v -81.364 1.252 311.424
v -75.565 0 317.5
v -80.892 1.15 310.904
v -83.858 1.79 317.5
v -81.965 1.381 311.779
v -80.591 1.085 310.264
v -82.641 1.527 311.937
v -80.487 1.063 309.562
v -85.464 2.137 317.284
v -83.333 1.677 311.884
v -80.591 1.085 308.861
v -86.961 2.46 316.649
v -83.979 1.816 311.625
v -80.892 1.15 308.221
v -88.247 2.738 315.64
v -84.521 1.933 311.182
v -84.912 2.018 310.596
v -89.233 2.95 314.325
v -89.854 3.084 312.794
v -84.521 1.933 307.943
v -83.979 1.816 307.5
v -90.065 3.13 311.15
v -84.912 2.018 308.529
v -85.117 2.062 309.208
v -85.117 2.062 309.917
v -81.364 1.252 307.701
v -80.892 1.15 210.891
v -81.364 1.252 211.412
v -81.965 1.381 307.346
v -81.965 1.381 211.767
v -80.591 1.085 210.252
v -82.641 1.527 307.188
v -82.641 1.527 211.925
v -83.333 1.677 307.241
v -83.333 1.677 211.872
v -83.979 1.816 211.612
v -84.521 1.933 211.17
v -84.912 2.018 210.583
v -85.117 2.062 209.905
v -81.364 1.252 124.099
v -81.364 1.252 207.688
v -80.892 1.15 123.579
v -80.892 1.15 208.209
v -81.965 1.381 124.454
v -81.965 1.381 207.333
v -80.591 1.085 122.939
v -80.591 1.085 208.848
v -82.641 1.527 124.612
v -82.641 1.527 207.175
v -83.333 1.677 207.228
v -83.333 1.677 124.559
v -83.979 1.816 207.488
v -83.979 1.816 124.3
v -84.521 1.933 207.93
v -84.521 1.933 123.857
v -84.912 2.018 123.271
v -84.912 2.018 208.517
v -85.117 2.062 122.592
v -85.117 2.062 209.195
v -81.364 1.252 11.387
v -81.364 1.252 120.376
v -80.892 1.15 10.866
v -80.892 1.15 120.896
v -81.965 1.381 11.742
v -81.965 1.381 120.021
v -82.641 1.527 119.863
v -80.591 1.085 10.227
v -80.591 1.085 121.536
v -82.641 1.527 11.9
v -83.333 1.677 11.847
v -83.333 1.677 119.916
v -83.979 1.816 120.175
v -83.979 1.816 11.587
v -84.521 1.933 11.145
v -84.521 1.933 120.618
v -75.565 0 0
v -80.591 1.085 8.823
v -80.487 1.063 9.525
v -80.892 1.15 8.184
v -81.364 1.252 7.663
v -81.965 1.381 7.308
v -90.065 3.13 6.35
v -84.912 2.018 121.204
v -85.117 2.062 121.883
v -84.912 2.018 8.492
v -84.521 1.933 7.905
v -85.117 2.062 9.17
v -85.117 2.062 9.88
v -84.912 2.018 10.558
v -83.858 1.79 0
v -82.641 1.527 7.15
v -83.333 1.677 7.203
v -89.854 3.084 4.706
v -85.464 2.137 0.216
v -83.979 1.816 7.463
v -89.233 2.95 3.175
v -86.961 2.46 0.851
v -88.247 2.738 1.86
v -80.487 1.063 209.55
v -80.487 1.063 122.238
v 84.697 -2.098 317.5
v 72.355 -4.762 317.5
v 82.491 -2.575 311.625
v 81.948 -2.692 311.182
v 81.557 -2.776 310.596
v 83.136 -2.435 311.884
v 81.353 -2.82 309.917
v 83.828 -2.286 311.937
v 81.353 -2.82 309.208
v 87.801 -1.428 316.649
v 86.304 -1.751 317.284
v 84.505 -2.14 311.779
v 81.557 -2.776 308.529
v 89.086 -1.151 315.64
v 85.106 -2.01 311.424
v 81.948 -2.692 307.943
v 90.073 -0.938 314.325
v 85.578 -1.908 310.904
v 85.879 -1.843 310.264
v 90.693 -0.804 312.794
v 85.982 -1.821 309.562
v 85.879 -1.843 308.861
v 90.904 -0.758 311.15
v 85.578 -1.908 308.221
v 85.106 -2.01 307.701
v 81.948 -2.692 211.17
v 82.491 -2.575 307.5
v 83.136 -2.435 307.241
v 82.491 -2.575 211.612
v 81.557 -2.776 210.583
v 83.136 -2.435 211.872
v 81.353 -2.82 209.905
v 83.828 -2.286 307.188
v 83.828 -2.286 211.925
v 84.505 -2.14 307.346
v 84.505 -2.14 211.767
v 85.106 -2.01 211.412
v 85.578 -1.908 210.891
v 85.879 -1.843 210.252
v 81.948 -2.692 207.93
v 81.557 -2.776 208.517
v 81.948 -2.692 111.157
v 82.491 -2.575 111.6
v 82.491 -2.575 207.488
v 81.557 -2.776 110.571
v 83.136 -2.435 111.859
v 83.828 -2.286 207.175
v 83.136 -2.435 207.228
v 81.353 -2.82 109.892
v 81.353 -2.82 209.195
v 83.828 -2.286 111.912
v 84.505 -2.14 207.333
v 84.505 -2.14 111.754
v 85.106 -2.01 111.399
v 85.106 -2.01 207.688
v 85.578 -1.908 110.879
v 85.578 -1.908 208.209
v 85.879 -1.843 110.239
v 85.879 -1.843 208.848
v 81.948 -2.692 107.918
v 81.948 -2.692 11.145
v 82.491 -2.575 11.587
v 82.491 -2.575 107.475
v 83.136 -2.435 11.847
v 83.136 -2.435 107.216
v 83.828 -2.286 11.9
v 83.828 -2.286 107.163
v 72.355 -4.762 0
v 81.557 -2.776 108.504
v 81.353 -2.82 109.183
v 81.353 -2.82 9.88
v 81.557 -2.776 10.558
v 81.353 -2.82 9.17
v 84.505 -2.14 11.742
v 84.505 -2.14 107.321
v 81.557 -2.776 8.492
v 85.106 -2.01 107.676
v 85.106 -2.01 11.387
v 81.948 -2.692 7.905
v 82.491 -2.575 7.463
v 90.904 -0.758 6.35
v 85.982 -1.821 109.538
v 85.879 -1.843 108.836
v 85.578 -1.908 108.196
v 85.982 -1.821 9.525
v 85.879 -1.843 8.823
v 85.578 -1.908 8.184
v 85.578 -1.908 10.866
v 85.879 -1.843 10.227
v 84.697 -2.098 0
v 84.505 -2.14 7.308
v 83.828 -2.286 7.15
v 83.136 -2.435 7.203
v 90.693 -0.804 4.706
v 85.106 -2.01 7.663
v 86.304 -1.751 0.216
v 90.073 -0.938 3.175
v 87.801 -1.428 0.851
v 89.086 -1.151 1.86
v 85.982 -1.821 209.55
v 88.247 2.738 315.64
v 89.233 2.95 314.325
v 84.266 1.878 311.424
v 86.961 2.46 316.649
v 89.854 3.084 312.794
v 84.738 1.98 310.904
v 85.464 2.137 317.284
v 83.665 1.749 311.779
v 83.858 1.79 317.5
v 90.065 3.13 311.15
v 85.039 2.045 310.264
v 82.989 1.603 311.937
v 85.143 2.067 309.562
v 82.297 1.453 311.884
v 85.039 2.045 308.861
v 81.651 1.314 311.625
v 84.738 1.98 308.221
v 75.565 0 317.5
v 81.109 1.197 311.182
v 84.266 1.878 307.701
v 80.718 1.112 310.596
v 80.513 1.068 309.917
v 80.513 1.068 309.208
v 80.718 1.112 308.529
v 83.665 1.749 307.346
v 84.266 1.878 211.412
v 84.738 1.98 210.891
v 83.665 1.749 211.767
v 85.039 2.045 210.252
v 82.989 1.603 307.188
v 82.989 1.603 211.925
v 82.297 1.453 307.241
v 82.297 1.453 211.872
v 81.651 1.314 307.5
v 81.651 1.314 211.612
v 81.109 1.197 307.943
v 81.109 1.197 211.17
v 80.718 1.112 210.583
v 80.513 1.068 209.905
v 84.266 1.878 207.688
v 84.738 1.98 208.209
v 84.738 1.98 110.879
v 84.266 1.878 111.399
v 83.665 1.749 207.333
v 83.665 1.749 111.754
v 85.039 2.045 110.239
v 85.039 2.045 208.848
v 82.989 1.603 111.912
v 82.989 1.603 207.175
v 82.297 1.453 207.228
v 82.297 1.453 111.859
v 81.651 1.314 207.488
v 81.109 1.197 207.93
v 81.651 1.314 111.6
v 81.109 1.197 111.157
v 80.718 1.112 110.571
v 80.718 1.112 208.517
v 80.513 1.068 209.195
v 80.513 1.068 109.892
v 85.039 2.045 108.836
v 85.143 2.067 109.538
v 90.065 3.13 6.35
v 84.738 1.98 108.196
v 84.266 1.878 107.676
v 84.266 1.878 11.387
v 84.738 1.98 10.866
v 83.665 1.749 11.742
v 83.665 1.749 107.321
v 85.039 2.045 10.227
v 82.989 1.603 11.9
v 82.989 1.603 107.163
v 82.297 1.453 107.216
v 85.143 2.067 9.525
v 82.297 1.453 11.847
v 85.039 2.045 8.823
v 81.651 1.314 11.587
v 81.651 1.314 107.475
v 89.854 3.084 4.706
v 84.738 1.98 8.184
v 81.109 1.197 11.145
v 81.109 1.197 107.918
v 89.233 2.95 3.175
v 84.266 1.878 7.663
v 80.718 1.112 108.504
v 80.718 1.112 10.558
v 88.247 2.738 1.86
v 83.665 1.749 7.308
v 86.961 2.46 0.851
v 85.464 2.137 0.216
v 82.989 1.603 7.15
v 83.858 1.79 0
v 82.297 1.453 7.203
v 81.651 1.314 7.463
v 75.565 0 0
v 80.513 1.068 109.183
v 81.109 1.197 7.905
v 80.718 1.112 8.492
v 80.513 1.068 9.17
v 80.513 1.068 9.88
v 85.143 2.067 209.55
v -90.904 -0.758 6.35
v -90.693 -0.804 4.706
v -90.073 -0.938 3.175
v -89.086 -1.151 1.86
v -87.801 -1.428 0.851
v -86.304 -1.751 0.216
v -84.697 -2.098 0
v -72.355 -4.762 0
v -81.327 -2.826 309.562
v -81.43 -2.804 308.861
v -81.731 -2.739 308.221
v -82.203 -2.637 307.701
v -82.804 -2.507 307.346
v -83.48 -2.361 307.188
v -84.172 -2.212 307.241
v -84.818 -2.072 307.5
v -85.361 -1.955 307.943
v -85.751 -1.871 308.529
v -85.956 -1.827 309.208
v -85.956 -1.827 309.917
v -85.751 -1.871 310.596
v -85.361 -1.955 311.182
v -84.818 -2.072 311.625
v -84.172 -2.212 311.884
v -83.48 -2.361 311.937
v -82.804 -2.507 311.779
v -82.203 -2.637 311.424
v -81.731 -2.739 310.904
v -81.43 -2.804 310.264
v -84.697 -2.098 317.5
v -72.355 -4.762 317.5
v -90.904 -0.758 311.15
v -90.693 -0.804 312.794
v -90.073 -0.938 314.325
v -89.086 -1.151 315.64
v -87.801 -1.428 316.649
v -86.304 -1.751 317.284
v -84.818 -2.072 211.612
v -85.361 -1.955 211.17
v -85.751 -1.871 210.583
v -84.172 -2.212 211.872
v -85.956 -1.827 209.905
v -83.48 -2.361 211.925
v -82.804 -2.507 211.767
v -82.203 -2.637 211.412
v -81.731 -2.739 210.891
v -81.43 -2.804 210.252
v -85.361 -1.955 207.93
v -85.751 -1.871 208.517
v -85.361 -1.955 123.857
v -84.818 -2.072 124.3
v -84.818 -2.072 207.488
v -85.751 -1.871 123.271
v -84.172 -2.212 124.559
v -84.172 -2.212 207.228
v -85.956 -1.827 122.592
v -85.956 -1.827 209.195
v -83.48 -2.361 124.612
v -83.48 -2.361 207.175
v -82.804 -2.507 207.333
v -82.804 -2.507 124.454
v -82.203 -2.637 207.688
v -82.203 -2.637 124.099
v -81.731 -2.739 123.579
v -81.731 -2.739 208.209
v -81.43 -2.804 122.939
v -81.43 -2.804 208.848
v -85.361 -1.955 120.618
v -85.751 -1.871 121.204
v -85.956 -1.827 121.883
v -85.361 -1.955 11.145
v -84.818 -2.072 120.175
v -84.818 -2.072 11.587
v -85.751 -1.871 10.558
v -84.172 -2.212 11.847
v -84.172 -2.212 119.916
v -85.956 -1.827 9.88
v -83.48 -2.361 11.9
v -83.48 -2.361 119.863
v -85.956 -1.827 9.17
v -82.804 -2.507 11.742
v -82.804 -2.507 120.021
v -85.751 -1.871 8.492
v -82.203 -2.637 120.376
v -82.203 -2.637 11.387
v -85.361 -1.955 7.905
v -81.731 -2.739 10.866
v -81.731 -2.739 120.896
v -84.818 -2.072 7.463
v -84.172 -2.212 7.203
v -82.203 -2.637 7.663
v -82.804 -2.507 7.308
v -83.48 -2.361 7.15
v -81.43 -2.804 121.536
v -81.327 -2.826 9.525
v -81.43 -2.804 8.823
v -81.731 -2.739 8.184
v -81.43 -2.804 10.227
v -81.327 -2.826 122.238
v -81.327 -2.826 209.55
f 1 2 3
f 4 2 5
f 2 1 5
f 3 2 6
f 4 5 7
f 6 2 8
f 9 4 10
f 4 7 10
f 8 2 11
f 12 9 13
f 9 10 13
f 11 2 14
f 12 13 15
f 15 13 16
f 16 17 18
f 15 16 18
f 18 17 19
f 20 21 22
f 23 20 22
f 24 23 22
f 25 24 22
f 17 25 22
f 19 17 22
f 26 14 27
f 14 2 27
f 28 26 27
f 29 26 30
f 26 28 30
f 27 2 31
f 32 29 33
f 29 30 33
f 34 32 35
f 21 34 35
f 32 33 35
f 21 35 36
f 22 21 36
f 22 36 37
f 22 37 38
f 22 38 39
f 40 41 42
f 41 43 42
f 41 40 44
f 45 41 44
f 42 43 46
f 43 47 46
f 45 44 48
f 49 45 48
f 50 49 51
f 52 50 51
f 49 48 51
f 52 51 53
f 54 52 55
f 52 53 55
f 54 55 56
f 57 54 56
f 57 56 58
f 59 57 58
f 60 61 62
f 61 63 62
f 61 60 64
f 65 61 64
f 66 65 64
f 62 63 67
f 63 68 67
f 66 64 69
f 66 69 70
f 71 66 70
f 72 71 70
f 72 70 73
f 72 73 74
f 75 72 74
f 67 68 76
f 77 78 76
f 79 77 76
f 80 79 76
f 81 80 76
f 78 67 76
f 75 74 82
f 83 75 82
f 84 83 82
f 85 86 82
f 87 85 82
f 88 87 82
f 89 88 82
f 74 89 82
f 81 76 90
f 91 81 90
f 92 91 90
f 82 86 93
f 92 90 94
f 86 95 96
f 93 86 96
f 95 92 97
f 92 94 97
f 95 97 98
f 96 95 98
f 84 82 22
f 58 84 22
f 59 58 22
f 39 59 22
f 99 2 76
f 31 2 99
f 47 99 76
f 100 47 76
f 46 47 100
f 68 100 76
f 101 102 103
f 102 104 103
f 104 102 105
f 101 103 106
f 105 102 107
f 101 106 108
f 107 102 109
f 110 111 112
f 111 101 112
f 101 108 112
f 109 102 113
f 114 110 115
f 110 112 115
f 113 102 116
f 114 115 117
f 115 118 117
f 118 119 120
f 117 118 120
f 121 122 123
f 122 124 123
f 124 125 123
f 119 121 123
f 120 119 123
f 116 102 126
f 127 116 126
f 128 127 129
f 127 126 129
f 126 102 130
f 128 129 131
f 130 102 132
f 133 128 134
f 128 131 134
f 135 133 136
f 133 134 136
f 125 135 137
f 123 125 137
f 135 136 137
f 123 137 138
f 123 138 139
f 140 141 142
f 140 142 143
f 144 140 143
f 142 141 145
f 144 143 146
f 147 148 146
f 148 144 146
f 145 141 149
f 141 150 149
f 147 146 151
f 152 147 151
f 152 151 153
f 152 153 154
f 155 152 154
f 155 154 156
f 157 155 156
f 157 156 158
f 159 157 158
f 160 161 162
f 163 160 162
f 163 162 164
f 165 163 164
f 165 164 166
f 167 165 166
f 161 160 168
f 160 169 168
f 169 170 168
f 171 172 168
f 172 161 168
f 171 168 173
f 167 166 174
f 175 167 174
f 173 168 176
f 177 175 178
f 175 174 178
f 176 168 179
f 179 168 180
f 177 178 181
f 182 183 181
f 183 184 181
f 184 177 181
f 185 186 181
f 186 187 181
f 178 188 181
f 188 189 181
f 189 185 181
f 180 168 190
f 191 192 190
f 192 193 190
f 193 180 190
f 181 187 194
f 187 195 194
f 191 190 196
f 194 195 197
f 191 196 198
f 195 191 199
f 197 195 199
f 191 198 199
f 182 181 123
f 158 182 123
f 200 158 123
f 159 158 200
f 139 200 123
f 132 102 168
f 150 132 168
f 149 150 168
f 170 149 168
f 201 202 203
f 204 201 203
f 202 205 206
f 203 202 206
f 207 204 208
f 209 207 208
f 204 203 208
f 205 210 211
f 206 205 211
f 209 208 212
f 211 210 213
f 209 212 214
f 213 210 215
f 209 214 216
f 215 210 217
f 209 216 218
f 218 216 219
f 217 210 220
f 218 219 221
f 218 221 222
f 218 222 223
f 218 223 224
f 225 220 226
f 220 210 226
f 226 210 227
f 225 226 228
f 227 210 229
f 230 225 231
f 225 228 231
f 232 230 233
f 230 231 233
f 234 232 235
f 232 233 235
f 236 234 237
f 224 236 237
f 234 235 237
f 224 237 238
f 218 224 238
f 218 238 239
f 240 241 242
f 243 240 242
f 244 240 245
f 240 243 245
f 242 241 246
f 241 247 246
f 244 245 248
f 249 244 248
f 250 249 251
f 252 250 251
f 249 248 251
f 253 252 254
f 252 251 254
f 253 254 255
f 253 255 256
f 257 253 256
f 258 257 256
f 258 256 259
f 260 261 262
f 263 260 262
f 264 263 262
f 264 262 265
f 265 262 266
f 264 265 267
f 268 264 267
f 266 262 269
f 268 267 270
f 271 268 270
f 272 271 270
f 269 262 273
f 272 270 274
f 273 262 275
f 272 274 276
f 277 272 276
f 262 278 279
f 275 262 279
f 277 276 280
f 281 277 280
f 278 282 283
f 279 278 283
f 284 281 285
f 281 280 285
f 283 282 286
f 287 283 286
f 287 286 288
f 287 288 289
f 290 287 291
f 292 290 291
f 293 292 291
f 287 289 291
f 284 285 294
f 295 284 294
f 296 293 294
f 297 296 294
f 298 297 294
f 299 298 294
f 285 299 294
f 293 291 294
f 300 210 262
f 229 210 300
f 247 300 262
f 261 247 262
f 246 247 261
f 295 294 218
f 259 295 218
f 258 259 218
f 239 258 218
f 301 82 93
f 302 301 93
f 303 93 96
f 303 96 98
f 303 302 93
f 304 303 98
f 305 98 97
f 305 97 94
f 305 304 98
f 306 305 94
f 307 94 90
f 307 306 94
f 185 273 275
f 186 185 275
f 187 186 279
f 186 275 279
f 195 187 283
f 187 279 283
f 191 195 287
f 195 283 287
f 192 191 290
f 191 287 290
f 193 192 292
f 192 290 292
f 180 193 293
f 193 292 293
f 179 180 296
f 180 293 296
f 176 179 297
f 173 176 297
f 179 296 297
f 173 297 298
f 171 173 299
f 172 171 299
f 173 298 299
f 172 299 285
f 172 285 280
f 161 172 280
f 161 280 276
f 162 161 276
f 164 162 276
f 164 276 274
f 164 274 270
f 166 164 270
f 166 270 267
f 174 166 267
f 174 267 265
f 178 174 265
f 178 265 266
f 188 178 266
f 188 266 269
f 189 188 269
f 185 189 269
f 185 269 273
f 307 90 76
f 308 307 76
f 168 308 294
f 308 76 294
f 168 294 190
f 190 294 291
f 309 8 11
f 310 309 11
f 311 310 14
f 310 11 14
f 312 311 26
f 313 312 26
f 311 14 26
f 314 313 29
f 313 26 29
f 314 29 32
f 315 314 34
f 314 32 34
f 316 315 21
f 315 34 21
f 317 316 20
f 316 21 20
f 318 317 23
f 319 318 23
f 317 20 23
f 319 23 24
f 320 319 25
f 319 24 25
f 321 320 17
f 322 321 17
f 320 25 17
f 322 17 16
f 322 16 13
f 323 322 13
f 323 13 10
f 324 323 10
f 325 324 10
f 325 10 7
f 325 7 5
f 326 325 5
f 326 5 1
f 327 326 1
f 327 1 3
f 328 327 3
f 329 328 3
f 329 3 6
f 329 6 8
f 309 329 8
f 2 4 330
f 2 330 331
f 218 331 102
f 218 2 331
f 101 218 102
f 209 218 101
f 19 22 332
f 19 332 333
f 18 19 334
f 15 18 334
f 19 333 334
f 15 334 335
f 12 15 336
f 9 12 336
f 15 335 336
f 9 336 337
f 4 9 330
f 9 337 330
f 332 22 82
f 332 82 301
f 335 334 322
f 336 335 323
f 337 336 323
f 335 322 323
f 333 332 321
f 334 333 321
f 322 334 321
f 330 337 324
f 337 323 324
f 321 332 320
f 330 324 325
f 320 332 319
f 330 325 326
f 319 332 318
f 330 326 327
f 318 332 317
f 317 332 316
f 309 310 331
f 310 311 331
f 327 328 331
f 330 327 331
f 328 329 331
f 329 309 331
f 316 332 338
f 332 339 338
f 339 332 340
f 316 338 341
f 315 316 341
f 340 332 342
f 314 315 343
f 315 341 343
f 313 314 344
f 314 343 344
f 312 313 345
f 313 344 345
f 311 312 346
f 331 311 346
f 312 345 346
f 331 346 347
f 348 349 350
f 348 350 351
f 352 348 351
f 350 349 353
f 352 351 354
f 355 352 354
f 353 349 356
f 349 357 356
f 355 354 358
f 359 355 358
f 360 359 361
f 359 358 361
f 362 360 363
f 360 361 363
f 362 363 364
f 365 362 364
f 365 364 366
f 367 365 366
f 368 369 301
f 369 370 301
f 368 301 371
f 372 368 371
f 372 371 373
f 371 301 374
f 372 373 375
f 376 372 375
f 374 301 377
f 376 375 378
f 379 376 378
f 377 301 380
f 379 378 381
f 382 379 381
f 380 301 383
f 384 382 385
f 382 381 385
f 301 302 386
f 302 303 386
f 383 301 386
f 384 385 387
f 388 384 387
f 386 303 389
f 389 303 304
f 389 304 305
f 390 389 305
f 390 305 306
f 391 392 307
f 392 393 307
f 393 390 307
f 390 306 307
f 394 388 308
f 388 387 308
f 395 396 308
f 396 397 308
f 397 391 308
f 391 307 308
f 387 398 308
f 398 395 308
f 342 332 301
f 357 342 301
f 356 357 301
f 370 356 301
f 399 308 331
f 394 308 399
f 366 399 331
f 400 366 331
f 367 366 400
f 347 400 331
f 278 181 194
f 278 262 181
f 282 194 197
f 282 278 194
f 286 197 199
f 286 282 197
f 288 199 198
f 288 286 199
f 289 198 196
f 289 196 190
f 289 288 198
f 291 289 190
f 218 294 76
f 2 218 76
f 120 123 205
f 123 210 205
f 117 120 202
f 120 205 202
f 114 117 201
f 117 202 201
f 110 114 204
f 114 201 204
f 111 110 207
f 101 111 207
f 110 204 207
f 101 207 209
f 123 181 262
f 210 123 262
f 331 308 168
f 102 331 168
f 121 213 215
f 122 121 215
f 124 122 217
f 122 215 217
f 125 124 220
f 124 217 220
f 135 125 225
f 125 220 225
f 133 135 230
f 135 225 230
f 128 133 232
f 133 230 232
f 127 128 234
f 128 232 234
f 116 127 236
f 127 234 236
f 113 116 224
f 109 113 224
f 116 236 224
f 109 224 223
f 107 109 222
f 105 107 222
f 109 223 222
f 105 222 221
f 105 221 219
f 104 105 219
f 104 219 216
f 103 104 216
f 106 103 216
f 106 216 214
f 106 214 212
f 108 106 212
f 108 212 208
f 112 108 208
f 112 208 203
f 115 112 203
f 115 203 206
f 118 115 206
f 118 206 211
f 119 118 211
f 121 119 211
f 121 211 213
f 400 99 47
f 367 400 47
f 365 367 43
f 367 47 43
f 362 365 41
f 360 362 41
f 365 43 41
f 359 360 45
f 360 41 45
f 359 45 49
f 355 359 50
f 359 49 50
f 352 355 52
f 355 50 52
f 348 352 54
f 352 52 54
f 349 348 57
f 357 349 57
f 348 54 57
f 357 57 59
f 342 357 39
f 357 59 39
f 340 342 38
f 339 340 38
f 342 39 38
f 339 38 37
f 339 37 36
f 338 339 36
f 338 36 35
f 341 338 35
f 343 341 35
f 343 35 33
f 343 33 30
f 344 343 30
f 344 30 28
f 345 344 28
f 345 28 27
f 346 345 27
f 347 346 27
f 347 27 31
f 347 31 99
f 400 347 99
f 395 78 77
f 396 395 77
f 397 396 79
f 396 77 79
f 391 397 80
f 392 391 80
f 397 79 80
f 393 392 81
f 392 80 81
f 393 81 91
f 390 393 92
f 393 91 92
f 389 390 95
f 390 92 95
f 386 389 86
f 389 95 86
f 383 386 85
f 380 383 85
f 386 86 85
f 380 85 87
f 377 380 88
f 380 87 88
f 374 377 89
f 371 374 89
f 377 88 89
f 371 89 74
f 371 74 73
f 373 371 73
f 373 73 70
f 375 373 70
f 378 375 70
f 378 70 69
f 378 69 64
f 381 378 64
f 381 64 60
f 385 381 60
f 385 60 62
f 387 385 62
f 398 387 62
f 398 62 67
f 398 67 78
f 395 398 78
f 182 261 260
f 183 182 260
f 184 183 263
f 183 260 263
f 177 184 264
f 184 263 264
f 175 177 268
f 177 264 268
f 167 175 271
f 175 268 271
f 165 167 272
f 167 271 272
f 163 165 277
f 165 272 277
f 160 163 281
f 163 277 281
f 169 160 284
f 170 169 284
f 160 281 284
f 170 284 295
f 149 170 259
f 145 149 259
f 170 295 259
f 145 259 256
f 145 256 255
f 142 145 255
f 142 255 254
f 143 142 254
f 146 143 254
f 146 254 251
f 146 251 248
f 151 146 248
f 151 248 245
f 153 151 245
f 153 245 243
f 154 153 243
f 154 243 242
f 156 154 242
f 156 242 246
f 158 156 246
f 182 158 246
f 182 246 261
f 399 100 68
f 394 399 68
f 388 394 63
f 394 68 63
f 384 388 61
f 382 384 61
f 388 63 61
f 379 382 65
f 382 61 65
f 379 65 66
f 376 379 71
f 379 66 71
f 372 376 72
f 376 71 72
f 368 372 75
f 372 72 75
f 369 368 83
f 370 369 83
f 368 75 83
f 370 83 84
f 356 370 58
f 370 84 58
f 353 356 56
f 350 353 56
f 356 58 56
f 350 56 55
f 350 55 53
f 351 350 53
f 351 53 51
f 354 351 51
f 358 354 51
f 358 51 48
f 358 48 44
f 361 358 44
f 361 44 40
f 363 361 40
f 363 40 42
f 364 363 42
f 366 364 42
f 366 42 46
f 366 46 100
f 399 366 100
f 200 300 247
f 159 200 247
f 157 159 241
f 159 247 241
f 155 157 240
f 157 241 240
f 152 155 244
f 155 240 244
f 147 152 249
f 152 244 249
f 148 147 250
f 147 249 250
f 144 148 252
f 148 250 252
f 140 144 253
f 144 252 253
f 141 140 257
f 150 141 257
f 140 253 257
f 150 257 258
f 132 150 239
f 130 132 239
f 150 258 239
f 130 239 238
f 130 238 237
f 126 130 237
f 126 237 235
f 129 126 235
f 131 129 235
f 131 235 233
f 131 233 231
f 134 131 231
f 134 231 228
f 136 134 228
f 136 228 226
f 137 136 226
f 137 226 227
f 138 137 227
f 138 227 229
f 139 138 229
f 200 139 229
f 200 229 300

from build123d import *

# Parameters (mm, degrees)
BOSS_EXTRUDE1_DEPTH = 317.5
FILLET1_R           = 6.35
SKETCH3_R           = 2.38125
CUT_EXTRUDE1_DEPTH  = 317.5
SKETCH4_R           = 2.38125
CUT_EXTRUDE2_DEPTH  = 317.5
LPATTERN5_COUNT     = 4
LPATTERN5_PITCH     = 100.0125


with BuildPart() as part:
    # Sketch1 → Boss-Extrude1 (new body)
    with BuildSketch(Plane.XY):
        Polygon((75.565, 0), (-75.565, 0), (-90.065, 3.13), (-90.904357489, -0.758397314), (-72.355, -4.7625), (72.355, -4.7625), (90.904357489, -0.758397314), (90.065, 3.13), align=None)
    extrude(amount=BOSS_EXTRUDE1_DEPTH)

    # Fillet1
    fillet1_edges = [part.edges().sort_by_distance(p)[0] for p in [
        (-90.484678745, 1.185801343, 0),
        (90.484678745, 1.185801343, 317.5),
        (-90.484678745, 1.185801343, 317.5),
        (90.484678745, 1.185801343, 0),
    ]]
    fillet(fillet1_edges, radius=FILLET1_R)

    # Sketch3 → Cut-Extrude1 (cut)
    with BuildSketch(Plane(origin=(-3.364295287, -15.5853935, 0), x_dir=(0.977485615, -0.211002067, 0), z_dir=(0.211002067, 0.977485615, 0))):
        with Locations((-81.280689445, -9.525)):
            Circle(SKETCH3_R)
        with Locations((-81.280689445, -122.2375)):
            Circle(SKETCH3_R)
        with Locations((-81.280689445, -209.55)):
            Circle(SKETCH3_R)
        with Locations((-81.280689445, -309.5625)):
            Circle(SKETCH3_R)
    extrude(amount=-CUT_EXTRUDE1_DEPTH, mode=Mode.SUBTRACT)

    # Sketch4 → Cut-Extrude2 (cut)
    with BuildSketch(Plane(origin=(3.364295287, -15.5853935, 0), x_dir=(0.977485615, 0.211002067, 0), z_dir=(-0.211002067, 0.977485615, 0))):
        with Locations((81.280689445, -9.525)):
            Circle(SKETCH4_R)
    cut_extrude2 = extrude(amount=-CUT_EXTRUDE2_DEPTH, mode=Mode.SUBTRACT)

    # LPattern5: Cut-Extrude2 ×4
    with Locations(*[(0, 0, i * LPATTERN5_PITCH) for i in range(1, LPATTERN5_COUNT)]):
        add(cut_extrude2, mode=Mode.SUBTRACT)


solid = part.part
